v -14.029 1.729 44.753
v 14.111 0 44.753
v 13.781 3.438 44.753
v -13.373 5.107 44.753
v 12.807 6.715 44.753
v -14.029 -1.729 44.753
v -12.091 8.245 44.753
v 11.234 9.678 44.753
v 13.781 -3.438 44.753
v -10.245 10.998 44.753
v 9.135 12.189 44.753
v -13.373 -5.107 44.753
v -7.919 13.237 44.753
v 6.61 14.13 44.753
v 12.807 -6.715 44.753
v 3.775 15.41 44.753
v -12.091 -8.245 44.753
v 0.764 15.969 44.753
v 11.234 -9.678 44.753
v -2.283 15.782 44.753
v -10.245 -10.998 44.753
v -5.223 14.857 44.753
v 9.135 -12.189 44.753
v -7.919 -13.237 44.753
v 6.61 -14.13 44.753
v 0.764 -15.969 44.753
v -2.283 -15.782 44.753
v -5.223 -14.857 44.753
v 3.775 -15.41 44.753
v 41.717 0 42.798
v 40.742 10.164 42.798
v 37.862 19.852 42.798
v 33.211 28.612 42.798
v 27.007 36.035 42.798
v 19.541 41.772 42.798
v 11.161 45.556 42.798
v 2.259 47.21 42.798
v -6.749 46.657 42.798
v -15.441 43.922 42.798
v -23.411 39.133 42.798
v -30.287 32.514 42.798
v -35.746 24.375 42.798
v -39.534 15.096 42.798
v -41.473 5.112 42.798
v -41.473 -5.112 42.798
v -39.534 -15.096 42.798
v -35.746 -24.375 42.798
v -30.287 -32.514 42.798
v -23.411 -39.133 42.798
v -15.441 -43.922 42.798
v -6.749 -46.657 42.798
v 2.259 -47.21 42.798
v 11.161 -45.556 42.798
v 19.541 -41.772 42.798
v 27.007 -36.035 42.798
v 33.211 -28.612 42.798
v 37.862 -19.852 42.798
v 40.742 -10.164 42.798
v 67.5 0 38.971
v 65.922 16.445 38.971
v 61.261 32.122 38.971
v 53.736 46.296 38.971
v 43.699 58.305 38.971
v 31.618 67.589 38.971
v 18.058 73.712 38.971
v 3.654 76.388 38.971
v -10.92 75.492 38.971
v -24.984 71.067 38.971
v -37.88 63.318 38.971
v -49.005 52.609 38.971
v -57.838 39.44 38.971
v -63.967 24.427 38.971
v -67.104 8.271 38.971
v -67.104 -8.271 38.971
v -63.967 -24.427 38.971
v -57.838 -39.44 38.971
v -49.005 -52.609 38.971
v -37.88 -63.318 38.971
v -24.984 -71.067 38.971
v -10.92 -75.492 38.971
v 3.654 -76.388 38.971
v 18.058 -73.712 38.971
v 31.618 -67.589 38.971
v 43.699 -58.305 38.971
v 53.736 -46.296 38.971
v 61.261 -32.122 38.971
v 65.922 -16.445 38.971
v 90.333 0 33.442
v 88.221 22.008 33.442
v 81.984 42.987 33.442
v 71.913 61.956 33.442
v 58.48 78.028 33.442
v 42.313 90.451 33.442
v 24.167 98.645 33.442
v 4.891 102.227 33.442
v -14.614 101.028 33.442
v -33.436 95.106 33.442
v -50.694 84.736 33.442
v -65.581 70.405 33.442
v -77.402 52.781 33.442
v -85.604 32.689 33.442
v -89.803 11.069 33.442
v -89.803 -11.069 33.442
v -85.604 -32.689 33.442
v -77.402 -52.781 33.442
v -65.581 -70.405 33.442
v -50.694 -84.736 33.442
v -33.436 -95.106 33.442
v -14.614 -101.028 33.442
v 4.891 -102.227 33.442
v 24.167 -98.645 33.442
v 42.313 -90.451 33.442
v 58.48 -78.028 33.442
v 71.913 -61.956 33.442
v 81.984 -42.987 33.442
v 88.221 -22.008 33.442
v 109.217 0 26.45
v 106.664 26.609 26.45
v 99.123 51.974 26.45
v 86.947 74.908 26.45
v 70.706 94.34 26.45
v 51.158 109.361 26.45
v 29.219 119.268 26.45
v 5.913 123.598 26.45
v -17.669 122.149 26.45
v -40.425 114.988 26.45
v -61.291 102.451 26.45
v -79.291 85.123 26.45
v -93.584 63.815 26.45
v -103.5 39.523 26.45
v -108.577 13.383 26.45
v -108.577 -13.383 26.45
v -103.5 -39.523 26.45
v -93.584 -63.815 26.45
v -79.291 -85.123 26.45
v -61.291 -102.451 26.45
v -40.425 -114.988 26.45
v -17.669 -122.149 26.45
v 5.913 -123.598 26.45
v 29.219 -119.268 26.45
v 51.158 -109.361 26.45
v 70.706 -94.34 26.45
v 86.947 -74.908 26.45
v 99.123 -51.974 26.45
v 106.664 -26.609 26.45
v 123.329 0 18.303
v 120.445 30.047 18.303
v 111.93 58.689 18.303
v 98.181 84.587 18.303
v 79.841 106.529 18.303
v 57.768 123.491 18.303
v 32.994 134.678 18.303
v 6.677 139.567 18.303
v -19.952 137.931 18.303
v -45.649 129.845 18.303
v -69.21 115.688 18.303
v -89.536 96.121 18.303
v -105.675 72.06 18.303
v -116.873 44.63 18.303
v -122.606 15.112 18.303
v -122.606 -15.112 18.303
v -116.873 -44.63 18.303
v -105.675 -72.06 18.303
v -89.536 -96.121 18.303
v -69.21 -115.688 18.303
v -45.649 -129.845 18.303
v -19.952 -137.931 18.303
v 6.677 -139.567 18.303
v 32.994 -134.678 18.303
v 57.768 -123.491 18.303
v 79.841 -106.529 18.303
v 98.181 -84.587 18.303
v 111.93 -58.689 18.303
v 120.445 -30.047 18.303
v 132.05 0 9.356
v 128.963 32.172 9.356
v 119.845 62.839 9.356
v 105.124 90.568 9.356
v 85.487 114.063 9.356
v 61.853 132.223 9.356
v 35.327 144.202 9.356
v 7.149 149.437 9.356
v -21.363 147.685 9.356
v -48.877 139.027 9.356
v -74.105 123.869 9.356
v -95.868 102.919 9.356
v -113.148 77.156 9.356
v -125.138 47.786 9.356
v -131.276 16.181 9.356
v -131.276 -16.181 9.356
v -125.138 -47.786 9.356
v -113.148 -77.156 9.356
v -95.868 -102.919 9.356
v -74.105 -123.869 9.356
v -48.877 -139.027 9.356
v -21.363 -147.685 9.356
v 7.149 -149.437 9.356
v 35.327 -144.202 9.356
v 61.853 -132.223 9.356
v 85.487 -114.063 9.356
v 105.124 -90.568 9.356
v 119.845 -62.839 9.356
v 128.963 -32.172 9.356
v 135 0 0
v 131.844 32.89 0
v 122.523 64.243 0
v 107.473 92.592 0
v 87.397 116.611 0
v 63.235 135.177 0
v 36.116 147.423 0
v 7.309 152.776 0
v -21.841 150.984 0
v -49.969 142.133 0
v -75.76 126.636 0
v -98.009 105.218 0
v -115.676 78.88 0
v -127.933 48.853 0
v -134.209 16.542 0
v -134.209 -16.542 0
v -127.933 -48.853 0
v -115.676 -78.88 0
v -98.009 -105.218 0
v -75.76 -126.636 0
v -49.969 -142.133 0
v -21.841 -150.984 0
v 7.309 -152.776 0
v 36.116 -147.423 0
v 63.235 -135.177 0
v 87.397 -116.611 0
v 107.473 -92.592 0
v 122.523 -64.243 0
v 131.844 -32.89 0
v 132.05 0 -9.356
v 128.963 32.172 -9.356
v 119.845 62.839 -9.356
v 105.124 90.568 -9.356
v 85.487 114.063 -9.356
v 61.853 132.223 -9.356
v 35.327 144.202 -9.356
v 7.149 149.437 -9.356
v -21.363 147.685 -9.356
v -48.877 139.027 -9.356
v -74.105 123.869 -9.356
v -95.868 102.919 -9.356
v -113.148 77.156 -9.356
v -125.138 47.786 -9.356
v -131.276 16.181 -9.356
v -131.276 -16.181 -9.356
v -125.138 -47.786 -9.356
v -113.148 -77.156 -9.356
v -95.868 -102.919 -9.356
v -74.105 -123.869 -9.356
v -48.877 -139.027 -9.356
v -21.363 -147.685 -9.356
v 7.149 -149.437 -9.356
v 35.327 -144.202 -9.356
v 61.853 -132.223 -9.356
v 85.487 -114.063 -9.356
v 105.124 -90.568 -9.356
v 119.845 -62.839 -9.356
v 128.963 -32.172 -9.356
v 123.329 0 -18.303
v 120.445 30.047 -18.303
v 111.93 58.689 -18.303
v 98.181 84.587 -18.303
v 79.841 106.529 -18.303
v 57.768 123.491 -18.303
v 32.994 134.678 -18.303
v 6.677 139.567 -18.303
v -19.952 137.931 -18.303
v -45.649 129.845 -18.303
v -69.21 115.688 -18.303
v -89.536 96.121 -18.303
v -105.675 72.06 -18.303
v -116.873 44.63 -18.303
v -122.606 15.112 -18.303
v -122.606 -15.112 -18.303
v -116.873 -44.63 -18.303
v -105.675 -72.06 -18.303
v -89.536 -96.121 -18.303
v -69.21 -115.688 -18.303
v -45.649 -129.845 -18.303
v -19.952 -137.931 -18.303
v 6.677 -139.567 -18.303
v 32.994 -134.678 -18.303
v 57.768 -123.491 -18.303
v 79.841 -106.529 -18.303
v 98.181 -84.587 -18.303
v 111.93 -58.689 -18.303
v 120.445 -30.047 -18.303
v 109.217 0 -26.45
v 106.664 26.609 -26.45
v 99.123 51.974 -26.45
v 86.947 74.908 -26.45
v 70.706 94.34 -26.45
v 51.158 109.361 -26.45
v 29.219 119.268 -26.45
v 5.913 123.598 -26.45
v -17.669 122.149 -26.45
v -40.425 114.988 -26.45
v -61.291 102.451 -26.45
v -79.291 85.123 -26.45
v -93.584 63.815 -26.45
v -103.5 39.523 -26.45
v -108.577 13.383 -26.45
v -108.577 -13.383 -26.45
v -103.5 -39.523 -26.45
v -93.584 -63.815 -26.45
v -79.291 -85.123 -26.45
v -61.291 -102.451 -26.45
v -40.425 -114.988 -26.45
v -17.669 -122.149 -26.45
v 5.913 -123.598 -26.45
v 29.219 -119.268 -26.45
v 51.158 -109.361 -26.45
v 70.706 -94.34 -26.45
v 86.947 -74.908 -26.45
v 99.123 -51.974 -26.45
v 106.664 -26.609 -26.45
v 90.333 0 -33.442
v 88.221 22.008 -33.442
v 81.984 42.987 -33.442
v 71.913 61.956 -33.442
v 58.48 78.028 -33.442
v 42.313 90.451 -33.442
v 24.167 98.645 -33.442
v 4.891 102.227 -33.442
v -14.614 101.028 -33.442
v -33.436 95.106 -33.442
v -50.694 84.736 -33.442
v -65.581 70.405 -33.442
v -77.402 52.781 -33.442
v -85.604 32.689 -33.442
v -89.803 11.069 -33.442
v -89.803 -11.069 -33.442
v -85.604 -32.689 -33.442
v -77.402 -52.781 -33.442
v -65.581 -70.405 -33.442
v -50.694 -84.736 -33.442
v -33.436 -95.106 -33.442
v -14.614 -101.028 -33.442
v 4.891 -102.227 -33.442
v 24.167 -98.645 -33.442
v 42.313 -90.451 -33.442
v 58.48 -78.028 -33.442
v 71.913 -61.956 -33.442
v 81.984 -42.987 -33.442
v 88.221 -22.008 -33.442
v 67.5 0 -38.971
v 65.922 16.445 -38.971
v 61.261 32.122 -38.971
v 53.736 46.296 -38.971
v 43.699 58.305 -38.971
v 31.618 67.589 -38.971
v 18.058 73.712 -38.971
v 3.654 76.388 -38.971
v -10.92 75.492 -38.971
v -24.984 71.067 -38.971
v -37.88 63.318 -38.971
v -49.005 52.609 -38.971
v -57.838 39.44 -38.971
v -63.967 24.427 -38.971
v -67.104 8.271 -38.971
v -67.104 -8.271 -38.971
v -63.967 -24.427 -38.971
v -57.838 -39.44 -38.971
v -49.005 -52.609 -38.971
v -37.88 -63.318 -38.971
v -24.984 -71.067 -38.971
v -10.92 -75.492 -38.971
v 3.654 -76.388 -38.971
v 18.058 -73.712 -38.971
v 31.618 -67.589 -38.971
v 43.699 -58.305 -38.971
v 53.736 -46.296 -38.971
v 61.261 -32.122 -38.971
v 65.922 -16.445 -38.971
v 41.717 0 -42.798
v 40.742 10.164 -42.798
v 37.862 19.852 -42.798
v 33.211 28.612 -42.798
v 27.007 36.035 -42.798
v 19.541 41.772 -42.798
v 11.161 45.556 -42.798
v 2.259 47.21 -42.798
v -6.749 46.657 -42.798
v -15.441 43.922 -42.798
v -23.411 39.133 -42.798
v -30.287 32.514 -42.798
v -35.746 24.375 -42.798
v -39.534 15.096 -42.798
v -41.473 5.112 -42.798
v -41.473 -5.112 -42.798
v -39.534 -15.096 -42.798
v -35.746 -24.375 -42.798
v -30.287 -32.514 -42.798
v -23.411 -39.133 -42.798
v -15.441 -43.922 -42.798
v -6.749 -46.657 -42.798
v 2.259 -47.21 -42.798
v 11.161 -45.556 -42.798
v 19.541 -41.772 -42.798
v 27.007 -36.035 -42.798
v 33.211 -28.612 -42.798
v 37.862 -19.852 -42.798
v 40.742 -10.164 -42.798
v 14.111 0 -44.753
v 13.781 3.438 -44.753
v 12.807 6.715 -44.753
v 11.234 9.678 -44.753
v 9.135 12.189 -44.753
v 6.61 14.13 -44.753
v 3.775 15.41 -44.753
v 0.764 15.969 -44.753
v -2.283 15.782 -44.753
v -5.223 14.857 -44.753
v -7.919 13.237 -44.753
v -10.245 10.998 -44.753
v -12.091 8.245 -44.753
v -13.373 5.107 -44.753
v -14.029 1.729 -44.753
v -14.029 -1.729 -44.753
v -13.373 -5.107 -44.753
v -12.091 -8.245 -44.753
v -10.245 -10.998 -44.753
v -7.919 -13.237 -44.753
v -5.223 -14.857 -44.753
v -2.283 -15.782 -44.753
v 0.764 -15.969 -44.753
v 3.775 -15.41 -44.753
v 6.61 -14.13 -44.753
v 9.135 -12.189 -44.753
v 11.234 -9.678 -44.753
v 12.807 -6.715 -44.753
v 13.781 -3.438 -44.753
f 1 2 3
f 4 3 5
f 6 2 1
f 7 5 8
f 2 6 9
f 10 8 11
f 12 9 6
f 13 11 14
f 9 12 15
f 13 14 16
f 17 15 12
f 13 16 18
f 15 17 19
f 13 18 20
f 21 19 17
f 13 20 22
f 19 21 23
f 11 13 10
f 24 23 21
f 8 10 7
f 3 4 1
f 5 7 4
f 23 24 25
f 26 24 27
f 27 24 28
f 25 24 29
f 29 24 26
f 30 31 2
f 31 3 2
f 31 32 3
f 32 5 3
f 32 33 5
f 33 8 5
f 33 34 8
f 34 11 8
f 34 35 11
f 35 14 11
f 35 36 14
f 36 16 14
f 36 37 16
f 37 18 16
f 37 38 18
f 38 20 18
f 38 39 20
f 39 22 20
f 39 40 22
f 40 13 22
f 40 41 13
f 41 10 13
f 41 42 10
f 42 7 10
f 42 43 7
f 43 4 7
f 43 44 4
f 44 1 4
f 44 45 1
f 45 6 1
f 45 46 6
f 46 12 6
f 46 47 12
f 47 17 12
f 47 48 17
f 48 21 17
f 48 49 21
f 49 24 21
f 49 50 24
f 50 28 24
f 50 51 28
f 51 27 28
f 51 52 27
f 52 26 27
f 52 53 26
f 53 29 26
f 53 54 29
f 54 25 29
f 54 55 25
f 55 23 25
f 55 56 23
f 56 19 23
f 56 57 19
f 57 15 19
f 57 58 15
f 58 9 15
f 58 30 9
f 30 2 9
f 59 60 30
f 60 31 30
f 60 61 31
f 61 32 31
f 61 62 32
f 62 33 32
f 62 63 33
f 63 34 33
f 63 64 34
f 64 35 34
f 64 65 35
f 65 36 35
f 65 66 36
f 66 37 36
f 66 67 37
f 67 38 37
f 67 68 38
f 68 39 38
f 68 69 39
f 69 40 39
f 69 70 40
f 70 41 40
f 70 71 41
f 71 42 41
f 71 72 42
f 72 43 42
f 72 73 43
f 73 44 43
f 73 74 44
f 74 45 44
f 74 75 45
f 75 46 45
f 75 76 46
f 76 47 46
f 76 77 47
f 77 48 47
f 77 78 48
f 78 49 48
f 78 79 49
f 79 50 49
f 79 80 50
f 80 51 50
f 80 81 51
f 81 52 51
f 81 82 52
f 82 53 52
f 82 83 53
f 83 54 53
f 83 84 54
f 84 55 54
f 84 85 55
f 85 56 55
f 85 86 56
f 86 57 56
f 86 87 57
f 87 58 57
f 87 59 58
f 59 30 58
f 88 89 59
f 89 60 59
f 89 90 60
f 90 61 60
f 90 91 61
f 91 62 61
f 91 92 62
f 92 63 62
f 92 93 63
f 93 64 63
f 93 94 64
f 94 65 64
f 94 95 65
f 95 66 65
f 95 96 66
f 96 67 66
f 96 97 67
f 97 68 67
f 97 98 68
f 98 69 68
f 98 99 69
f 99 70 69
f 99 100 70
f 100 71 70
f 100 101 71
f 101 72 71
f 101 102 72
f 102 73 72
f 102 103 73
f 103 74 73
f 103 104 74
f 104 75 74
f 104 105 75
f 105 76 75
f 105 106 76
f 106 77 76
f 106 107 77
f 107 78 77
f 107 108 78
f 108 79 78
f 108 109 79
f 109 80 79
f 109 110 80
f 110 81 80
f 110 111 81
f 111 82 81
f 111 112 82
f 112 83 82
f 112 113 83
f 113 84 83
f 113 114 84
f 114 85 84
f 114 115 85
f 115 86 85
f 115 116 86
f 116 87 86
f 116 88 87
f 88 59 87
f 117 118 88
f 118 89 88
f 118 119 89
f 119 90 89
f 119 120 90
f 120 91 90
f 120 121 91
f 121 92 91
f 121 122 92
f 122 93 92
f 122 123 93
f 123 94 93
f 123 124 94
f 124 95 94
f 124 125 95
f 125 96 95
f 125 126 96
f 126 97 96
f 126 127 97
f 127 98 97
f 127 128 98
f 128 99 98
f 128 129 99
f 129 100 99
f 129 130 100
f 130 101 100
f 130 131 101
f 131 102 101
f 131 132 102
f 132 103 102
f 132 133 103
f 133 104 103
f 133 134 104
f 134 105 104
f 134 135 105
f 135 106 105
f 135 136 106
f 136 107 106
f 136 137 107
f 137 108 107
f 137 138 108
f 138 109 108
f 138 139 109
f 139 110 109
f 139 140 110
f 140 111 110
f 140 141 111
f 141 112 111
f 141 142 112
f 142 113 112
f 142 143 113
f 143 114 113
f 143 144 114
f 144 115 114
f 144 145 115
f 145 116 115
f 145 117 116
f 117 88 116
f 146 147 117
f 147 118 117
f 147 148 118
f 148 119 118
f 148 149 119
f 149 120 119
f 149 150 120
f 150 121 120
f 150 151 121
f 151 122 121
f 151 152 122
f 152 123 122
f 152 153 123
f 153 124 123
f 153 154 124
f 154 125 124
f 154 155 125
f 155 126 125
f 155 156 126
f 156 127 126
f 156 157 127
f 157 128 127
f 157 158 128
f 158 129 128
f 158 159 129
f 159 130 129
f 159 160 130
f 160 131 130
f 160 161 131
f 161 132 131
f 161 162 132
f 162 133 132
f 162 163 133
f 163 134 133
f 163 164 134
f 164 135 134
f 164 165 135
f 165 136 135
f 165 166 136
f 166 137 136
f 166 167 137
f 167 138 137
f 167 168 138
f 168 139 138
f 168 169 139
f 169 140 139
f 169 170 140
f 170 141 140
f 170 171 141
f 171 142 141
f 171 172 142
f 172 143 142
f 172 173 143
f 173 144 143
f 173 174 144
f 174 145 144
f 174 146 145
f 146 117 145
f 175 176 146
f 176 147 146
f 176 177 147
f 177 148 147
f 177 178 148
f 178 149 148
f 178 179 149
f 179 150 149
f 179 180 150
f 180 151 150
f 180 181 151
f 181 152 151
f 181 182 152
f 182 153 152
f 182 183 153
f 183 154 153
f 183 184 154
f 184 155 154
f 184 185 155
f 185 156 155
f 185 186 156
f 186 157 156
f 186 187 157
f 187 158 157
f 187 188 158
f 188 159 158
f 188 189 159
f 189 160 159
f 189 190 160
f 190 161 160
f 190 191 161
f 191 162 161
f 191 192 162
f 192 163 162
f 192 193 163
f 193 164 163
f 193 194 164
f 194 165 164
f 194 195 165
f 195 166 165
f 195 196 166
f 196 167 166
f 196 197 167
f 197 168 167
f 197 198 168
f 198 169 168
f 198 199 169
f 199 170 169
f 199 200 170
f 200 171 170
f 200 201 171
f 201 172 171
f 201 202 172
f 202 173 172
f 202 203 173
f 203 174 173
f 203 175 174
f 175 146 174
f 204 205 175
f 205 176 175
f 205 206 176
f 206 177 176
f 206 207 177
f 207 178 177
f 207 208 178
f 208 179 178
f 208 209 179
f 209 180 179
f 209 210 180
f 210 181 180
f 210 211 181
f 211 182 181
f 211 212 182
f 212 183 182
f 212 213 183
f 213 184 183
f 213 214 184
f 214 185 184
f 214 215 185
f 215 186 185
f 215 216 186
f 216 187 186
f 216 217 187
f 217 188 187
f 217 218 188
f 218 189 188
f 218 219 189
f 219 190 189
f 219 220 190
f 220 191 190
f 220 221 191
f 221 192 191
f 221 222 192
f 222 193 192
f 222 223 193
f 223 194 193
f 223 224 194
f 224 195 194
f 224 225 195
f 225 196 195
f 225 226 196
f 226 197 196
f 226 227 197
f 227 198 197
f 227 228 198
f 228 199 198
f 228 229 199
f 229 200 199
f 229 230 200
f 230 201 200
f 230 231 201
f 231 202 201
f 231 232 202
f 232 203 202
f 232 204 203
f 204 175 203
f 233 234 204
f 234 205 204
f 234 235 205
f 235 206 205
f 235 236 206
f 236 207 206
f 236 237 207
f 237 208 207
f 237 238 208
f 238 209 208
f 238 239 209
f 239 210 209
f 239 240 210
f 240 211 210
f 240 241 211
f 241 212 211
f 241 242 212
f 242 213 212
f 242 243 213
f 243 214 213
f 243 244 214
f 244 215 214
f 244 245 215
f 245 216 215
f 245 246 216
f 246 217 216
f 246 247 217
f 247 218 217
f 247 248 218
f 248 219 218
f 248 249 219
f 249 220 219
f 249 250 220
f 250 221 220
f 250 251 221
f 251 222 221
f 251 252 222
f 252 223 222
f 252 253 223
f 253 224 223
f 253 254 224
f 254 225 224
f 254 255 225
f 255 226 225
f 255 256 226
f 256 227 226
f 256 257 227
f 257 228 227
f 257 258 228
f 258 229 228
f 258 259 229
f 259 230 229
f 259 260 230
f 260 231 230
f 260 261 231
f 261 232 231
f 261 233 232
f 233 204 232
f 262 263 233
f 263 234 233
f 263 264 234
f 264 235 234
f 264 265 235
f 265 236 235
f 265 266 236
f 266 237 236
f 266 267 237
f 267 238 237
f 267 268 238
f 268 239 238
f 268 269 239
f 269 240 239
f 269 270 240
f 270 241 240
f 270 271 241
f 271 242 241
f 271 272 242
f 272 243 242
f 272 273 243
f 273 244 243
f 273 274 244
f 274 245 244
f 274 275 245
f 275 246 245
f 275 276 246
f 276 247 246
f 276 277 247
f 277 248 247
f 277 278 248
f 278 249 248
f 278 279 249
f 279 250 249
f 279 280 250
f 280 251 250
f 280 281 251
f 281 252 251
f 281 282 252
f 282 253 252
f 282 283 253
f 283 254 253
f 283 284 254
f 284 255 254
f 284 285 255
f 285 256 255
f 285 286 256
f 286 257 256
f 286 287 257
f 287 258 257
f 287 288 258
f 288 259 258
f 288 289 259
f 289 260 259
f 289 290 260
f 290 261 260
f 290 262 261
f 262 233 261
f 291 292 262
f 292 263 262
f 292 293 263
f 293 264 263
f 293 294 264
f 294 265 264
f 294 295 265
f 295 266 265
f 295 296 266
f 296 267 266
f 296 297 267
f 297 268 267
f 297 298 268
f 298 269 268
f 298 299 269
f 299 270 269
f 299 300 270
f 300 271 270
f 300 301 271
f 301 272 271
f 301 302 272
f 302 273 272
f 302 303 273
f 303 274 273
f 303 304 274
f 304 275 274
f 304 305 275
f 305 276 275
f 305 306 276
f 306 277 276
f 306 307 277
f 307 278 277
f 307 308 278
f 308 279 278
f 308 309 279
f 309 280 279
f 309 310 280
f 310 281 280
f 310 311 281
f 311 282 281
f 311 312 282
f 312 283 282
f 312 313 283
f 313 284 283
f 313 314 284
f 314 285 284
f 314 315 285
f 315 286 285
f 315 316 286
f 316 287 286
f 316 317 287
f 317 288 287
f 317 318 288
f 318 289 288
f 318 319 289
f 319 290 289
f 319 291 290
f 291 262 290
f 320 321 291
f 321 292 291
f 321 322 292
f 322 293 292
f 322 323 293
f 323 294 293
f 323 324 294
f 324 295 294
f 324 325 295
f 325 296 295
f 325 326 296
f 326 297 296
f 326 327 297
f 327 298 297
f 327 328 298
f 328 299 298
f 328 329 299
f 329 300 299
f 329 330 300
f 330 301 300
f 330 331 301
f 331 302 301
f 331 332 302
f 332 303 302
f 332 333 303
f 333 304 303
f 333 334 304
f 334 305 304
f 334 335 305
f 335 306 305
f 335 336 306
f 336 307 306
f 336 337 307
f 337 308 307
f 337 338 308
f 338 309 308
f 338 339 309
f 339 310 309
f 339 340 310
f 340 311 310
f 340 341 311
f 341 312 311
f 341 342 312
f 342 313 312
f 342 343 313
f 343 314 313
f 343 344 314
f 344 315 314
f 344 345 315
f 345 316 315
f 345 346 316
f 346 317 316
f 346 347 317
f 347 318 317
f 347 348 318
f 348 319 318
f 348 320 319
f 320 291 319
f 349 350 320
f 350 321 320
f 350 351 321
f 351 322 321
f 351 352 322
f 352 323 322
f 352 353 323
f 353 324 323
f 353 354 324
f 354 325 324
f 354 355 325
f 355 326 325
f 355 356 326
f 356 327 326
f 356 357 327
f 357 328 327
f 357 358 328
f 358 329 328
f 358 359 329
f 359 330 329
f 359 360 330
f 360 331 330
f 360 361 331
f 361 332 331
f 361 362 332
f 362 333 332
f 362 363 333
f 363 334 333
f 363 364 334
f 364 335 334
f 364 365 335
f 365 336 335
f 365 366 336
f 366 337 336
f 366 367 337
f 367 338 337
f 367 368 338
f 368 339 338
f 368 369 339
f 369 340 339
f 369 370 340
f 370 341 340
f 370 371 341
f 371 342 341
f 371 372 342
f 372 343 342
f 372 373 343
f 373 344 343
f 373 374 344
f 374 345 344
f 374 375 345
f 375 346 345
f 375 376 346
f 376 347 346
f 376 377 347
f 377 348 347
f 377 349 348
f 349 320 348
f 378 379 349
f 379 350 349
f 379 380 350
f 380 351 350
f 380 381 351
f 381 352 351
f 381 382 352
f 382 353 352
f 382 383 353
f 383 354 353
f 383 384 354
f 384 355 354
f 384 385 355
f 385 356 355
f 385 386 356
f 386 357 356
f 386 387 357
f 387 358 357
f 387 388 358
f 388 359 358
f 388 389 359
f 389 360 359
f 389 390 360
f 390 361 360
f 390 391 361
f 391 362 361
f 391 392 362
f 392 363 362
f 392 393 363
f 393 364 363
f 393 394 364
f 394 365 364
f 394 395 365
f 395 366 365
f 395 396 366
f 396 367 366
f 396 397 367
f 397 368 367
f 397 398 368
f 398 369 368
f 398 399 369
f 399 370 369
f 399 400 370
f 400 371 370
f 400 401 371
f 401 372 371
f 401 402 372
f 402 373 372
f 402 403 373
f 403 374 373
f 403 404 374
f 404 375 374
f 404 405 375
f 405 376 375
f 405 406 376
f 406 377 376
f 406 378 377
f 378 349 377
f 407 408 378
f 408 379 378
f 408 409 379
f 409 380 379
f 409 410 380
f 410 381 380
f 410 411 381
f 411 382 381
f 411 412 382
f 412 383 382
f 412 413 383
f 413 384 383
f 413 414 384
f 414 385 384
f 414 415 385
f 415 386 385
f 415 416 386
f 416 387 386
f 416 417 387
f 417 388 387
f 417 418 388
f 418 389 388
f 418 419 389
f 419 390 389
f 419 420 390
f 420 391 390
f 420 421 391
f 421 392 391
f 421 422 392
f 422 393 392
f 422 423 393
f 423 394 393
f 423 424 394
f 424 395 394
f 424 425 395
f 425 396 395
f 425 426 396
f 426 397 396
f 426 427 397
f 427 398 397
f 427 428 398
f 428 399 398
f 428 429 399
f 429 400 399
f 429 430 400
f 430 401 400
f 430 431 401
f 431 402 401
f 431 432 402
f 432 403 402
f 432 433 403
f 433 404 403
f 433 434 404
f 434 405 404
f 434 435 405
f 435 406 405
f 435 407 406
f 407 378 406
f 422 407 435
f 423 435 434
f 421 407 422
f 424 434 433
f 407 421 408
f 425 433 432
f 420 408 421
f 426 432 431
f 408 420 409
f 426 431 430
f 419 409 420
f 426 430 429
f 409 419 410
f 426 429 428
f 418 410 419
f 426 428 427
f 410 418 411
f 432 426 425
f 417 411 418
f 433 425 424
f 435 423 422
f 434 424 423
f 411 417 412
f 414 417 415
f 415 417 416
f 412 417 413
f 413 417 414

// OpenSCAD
// Generated by SolidPython 1.0.1 on 2020-07-29 00:46:52


scale(v = [15, 17, 5]) {
	sphere(r = 9);
}
/***********************************************
*********      SolidPython code:      **********
************************************************
 
# import packages: SolidPython
from solid import *
from solid.utils import *
from itertools import chain, combinations, permutations


class Resize:

    def __init__(self, scad_file):
        self.scad_file = scad_file
        #self.scad_file = import_scad(scad_file)
        # cone/cylinder param:
        self.r1 = 0
        self.r2 = 0
        self.h = 0
        # rectangular prism param:
        self.w = 0
        self.l = 0
        # ellipse param:
        self.r = 0

    # import OpenScad code (file name corresponds to shape)


    # classify shape + parameters
    def assign(self, param1, param2, param3):
        if self.scad_file == 'cone.scad':
            self.r1 = param1
            self.r2 = param2
            self.h = param3
        elif self.scad_file == 'cylinder.scad':
            self.r1 = param1
            self.r2 = param2
            self.h = param3
        elif self.scad_file == 'rectangularPrism.scad':
            self.h = param1
            self.l = param2
            self.w = param3
        else:
            self.r = param1
            self.h = param2

    # resize parameters
    def iterate(self):
        x = range(3, 20, 2)
        i = 1
        if self.scad_file == 'cone.scad':
            tempList = list(permutations(x, 2))
            for temp in tempList:
                param1 = temp[0]
                param2 = temp[1]
                filepath = 'produced_scad_files/' + 'cone' + str(param1) + '_' + str(param2) + '_' + '.scad'
                scad_render_to_file(cylinder(h=param1, r1=param2, r2=0), filepath)

        elif self.scad_file == 'cylinder.scad':
            tempList = list(permutations(x, 3))
            for temp in tempList:
                param1 = temp[0]
                param2 = temp[1]
                filepath = 'produced_scad_files/' + 'cylinder' + str(param1) + '_' + str(param2) + '_' + '.scad'
                scad_render_to_file(cylinder(h=param1, r1=param2, r2=param2), filepath)

        elif self.scad_file == 'rectangularPrism.scad':
            tempList = list(permutations(x, 3))
            for temp in tempList:
                param1 = temp[0]
                param2 = temp[1]
                param3 = temp[2]
                filepath = 'produced_scad_files/' + 'rectangularPrism' + str(param1) + '_' + str(param2) + '_' + str(
                    param3) + '.scad'
                scad_render_to_file(cube(size=(param1, param2, param3)), filepath)

        elif self.scad_file == 'ellipse.scad':
            tempList = list(permutations(x, 4))
            for temp in tempList:
                param1 = temp[0]
                param2 = temp[1]
                param3 = temp[2]
                param4 = temp[3]
                filepath = 'produced_scad_files/' + 'ellipse' + str(param1) + '_' + str(param2) + '_' + str(param3) + '_' + str(param4) + '.scad'
                scad_render_to_file(scale([param1, param2, param3])(sphere(r=param4)), filepath)

    def render_to_scadfile(self):
        scad_render_to_file(scad, 'example.scad') 
 
************************************************/
